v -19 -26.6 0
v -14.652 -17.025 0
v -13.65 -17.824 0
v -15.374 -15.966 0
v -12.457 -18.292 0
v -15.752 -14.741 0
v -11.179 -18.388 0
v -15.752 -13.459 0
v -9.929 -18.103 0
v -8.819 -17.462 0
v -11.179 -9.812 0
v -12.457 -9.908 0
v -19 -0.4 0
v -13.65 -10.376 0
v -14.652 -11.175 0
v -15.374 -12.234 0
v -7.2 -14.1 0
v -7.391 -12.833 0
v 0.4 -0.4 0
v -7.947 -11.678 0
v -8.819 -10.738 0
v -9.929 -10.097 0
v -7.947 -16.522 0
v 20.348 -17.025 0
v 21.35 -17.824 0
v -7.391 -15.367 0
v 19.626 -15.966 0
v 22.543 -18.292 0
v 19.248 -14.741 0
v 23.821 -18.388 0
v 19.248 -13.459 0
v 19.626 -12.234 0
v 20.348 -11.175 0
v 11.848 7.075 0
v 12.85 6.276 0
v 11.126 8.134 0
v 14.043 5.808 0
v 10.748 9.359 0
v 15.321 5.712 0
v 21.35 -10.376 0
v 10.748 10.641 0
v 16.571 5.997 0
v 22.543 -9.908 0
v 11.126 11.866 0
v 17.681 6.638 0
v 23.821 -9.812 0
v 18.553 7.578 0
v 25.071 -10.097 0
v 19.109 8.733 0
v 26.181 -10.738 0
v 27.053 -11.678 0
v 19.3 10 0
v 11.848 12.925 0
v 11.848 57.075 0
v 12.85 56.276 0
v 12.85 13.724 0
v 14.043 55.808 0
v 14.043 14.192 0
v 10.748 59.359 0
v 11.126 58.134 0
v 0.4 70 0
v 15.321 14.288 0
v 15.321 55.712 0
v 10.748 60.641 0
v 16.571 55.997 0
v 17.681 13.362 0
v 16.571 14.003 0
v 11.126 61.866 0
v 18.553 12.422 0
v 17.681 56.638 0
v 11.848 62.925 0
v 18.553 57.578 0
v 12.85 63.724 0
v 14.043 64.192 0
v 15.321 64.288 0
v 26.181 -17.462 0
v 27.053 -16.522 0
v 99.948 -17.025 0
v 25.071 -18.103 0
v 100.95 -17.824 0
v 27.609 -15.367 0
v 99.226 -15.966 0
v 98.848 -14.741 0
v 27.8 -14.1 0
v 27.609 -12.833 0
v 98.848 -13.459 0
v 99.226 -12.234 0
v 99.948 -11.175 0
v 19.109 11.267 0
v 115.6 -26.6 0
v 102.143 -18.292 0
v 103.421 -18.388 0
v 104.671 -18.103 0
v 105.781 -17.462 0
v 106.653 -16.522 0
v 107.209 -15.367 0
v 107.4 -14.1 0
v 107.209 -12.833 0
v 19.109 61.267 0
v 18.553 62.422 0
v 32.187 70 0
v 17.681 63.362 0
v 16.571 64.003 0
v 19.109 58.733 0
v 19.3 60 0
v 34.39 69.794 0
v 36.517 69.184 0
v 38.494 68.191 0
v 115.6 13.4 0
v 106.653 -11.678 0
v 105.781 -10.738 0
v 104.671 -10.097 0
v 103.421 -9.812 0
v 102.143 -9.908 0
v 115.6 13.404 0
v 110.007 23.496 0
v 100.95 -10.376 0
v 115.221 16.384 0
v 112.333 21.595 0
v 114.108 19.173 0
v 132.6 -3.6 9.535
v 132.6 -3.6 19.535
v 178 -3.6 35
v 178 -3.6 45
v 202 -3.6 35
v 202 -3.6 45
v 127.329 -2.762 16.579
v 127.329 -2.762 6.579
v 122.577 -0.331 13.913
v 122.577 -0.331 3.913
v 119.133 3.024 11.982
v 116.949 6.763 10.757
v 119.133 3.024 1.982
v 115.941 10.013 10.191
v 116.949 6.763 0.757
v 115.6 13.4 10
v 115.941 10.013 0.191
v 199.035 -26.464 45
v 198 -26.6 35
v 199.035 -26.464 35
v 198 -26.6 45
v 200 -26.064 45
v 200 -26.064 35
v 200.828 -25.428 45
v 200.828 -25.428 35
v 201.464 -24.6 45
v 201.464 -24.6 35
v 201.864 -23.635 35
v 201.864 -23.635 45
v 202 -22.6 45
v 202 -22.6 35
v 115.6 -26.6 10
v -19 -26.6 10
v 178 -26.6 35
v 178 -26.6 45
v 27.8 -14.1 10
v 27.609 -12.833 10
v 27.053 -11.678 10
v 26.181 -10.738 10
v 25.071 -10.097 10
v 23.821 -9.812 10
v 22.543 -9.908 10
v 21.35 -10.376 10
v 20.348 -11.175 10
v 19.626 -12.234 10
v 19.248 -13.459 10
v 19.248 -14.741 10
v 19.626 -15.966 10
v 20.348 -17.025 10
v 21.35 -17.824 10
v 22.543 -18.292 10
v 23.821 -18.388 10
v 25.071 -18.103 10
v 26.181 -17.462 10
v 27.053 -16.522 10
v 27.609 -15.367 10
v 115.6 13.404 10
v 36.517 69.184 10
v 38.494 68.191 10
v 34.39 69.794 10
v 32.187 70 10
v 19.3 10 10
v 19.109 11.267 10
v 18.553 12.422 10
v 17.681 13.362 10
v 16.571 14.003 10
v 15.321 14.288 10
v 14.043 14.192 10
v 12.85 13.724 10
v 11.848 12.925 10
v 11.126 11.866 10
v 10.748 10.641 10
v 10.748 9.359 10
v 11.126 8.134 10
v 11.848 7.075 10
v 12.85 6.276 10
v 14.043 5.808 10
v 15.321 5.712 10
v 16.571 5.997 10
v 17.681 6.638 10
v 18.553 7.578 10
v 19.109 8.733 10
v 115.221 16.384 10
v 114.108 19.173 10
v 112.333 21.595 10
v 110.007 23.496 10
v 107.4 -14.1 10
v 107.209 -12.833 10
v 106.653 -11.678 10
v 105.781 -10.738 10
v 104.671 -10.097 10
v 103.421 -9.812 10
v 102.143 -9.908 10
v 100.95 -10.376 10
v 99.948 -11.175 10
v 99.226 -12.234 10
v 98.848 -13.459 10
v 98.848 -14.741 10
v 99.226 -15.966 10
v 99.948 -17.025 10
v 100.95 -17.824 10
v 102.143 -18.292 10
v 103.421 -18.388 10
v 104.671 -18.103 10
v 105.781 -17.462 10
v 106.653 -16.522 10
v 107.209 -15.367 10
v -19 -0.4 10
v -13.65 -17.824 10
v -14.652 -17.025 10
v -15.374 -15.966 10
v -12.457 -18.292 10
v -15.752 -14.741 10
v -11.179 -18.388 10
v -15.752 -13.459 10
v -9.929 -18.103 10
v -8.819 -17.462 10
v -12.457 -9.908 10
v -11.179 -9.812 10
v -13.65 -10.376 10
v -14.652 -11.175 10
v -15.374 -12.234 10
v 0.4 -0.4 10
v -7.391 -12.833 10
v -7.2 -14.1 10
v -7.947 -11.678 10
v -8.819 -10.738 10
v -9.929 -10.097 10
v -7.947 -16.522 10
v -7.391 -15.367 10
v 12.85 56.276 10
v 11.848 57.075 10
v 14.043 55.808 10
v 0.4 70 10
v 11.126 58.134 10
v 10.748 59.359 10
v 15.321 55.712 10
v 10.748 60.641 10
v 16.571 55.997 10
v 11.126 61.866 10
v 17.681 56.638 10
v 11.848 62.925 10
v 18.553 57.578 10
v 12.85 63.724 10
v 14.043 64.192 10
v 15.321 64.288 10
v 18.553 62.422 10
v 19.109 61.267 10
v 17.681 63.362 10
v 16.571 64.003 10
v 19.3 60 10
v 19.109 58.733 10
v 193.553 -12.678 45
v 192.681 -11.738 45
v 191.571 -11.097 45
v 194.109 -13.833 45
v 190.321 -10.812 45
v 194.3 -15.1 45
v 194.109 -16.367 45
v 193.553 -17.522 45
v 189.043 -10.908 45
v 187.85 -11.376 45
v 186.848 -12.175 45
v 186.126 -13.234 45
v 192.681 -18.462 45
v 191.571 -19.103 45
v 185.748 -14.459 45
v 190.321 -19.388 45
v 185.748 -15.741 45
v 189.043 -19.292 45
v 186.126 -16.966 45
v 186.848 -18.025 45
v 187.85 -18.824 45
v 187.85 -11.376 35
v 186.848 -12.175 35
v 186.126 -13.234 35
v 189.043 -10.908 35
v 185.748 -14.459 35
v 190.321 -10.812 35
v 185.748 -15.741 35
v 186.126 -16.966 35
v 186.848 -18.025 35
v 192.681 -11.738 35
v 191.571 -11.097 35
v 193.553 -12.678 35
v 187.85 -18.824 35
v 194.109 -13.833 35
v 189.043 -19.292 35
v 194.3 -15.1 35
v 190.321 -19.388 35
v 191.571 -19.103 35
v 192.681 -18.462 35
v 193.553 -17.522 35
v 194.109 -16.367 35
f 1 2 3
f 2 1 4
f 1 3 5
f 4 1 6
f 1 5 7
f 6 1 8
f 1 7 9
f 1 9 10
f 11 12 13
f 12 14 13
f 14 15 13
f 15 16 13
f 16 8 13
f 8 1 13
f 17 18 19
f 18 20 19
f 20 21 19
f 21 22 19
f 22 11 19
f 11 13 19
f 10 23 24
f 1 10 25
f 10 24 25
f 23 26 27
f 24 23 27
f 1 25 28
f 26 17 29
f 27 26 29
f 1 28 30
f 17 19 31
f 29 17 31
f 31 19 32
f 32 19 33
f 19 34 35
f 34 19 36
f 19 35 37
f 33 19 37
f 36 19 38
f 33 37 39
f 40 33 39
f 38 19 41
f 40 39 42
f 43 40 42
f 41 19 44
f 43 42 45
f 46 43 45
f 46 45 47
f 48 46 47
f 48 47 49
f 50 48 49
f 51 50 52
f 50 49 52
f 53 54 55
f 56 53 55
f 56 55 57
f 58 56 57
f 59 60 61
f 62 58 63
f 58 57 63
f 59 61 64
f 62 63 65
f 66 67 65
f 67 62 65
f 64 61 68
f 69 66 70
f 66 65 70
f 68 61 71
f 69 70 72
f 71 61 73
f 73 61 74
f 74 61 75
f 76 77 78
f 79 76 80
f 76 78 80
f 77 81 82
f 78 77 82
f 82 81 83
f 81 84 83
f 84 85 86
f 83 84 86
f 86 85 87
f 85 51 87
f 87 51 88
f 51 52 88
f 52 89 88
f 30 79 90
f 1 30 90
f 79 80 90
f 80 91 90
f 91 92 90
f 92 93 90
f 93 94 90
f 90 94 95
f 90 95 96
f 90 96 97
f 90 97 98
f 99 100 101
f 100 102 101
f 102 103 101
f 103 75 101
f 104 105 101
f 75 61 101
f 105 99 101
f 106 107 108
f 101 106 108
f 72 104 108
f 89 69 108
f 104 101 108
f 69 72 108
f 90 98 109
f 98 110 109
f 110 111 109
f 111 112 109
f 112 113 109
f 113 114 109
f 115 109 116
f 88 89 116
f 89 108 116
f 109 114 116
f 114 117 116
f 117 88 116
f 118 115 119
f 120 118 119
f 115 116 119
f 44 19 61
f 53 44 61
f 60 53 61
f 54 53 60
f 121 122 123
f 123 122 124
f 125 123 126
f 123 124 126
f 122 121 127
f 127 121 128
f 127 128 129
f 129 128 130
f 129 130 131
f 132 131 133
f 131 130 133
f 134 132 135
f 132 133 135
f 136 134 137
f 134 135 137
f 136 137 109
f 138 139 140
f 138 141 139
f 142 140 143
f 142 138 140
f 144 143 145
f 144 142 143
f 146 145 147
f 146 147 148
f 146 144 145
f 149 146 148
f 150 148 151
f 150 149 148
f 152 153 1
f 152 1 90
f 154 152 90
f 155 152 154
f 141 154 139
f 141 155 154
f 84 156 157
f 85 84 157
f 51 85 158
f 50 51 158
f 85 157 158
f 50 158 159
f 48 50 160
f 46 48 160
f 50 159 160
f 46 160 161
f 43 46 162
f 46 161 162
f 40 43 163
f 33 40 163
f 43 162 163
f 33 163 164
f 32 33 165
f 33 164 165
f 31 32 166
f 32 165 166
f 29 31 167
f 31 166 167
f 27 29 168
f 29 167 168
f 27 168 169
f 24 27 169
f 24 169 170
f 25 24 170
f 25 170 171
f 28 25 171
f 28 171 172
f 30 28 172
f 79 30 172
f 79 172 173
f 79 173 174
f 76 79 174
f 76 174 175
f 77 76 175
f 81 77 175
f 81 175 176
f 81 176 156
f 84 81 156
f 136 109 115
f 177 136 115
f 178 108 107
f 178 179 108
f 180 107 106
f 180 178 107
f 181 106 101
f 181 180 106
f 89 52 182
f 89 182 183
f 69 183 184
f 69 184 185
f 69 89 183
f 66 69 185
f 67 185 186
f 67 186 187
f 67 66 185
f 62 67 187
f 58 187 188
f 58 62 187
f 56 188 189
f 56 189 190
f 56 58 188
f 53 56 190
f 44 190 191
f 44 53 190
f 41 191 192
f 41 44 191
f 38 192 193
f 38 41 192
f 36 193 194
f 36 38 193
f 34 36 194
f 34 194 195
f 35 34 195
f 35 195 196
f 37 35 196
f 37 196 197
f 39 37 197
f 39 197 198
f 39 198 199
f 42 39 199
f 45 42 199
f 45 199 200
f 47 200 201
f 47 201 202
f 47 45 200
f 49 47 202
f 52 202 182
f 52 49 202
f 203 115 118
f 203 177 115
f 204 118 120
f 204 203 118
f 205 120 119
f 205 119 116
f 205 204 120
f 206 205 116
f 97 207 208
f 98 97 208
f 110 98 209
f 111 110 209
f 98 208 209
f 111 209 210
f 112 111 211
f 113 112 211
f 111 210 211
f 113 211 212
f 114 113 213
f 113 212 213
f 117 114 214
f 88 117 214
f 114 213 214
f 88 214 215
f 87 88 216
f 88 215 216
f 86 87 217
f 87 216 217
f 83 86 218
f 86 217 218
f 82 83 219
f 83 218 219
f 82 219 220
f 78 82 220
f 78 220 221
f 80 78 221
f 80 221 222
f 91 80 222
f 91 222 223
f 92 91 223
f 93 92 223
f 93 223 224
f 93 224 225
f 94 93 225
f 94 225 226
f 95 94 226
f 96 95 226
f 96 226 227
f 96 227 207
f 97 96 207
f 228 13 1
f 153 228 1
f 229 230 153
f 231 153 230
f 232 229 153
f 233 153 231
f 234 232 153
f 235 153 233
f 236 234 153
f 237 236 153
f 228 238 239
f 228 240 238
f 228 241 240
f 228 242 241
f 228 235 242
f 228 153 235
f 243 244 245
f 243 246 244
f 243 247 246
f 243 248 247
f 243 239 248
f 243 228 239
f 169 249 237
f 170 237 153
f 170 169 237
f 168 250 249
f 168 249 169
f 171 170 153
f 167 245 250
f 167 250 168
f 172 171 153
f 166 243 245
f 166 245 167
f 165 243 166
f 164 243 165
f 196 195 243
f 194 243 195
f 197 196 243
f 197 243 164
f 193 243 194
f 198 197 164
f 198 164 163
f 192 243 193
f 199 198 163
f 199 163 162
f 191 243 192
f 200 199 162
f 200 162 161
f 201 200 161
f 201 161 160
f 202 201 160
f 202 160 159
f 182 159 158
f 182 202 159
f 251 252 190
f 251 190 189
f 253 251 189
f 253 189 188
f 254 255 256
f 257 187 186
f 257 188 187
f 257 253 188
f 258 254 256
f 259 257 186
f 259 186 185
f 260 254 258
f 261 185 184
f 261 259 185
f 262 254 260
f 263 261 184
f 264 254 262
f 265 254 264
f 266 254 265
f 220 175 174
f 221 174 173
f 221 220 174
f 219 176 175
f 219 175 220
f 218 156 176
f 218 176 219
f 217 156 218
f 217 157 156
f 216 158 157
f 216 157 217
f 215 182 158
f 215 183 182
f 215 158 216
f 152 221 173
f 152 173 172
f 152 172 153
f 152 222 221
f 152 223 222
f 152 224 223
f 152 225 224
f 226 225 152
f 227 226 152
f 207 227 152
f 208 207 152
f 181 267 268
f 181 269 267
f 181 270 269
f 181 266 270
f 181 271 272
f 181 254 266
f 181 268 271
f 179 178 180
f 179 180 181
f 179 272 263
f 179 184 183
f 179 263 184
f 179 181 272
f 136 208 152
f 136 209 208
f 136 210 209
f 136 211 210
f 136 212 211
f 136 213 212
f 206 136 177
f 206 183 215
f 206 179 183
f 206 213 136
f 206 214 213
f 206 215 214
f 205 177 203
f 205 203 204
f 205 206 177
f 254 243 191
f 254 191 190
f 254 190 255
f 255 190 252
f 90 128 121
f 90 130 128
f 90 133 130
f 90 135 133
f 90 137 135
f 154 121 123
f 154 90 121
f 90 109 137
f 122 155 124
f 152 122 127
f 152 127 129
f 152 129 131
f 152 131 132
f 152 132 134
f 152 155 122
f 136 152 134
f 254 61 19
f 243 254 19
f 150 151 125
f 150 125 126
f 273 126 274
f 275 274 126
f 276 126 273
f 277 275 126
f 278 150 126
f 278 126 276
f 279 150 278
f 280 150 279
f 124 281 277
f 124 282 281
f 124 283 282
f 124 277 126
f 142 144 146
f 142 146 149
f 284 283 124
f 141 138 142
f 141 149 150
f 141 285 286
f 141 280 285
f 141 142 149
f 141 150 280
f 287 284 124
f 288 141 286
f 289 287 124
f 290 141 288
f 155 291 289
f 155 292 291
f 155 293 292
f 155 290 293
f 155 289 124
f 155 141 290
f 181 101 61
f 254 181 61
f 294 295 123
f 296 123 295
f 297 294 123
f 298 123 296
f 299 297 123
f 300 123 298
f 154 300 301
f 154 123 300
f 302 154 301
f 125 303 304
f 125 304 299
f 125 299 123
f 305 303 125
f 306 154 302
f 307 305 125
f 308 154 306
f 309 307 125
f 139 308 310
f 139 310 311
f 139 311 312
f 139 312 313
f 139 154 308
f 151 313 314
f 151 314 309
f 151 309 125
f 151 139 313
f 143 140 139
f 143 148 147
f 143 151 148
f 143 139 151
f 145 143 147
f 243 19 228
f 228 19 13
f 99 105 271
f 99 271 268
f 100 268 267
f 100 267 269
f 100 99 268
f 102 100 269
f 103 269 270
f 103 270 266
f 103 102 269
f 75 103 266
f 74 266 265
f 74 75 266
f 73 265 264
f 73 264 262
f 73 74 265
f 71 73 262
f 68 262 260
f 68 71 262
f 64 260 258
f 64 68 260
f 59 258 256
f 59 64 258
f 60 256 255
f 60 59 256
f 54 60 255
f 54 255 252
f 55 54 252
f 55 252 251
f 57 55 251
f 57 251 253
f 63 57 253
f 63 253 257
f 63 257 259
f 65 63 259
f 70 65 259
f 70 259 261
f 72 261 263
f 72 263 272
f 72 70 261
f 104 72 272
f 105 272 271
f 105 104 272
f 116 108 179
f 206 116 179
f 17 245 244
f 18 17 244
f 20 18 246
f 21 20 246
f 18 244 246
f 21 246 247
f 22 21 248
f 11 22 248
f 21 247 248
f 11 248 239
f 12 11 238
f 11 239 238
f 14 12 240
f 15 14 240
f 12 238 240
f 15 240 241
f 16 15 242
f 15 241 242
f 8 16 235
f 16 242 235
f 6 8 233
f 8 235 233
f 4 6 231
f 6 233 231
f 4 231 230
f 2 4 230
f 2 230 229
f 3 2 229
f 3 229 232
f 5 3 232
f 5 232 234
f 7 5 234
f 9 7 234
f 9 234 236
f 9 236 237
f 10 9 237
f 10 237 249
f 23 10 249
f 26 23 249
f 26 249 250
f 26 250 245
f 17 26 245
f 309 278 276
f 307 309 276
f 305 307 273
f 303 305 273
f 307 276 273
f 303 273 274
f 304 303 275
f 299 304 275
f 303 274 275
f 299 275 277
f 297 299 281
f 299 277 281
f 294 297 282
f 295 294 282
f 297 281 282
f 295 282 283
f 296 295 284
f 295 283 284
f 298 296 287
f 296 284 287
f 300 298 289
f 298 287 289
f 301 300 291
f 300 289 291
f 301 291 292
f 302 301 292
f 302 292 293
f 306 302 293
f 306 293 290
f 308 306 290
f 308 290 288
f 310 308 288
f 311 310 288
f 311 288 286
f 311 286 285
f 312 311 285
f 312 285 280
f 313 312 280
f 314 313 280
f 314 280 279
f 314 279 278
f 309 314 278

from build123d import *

# Parameters (mm, degrees)
SKETCH_R        = 4.3
PAD_DEPTH       = 10
PAD001_DEPTH    = 23
FILLET_R        = 17
SKETCH002_R     = 4.3
POCKET_DEPTH    = 45.001
FILLET001_R     = 4
SKETCH003_R     = 4.3
POCKET001_DEPTH = 10.001
CHAMFER_SIZE2   = 80
CHAMFER_SIZE    = 50
FILLET002_R     = 11.9


with BuildPart() as part:
    # Sketch → Pad (new body)
    with BuildSketch(Plane.XY):
        Polygon((0.4, 70), (0.4, -0.4), (-19, -0.4), (-19, -26.6), (115.6, -26.6), (115.6, 0), (115.6, 70), align=None)
        with Locations((15, 60)):
            Circle(SKETCH_R, mode=Mode.SUBTRACT)
        with Locations((15, 10)):
            Circle(SKETCH_R, mode=Mode.SUBTRACT)
    extrude(amount=PAD_DEPTH)

    # Sketch001 (on Face4 of Pad) → Pad001 (join)
    with BuildSketch(Plane.XZ.offset(26.6)):
        Polygon((115.6, 0), (178, 35), (202, 35), (202, 45), (178, 45), (115.6, 10), align=None)
    extrude(amount=-PAD001_DEPTH)

    # Fillet
    fillet_edges = [part.edges().sort_by_distance(p)[0] for p in [
        (115.6, -3.6, 5),
    ]]
    fillet(fillet_edges, radius=FILLET_R)

    # Sketch002 (on Face16 of Fillet) → Pocket (cut, through all)
    with BuildSketch(Plane.XY.offset(45)):
        with Locations((190, -15.1)):
            Circle(SKETCH002_R)
    extrude(amount=-POCKET_DEPTH, mode=Mode.SUBTRACT)

    # Fillet001
    fillet001_edges = [part.edges().sort_by_distance(p)[0] for p in [
        (202, -26.6, 40),
    ]]
    fillet(fillet001_edges, radius=FILLET001_R)

    # Sketch003 (on Face9 of Fillet001) → Pocket001 (cut, through all)
    with BuildSketch(Plane.XY.offset(10)):
        with Locations((-11.5, -14.1)):
            Circle(SKETCH003_R)
        with Locations((23.5, -14.1)):
            Circle(SKETCH003_R)
        with Locations((103.1, -14.1)):
            Circle(SKETCH003_R)
    extrude(amount=-POCKET001_DEPTH, mode=Mode.SUBTRACT)

    # Chamfer
    chamfer_edges = [part.edges().sort_by_distance(p)[0] for p in [
        (115.6, 70, 5),
    ]]
    chamfer_side = part.faces().sort_by_distance((115.6, 41.7, 5))[0]
    chamfer(chamfer_edges, length=CHAMFER_SIZE, length2=CHAMFER_SIZE2, reference=chamfer_side)

    # Fillet002
    fillet002_edges = [part.edges().sort_by_distance(p)[0] for p in [
        (115.6, 20, 5),
        (35.6, 70, 5),
    ]]
    fillet(fillet002_edges, radius=FILLET002_R)


solid = part.part
